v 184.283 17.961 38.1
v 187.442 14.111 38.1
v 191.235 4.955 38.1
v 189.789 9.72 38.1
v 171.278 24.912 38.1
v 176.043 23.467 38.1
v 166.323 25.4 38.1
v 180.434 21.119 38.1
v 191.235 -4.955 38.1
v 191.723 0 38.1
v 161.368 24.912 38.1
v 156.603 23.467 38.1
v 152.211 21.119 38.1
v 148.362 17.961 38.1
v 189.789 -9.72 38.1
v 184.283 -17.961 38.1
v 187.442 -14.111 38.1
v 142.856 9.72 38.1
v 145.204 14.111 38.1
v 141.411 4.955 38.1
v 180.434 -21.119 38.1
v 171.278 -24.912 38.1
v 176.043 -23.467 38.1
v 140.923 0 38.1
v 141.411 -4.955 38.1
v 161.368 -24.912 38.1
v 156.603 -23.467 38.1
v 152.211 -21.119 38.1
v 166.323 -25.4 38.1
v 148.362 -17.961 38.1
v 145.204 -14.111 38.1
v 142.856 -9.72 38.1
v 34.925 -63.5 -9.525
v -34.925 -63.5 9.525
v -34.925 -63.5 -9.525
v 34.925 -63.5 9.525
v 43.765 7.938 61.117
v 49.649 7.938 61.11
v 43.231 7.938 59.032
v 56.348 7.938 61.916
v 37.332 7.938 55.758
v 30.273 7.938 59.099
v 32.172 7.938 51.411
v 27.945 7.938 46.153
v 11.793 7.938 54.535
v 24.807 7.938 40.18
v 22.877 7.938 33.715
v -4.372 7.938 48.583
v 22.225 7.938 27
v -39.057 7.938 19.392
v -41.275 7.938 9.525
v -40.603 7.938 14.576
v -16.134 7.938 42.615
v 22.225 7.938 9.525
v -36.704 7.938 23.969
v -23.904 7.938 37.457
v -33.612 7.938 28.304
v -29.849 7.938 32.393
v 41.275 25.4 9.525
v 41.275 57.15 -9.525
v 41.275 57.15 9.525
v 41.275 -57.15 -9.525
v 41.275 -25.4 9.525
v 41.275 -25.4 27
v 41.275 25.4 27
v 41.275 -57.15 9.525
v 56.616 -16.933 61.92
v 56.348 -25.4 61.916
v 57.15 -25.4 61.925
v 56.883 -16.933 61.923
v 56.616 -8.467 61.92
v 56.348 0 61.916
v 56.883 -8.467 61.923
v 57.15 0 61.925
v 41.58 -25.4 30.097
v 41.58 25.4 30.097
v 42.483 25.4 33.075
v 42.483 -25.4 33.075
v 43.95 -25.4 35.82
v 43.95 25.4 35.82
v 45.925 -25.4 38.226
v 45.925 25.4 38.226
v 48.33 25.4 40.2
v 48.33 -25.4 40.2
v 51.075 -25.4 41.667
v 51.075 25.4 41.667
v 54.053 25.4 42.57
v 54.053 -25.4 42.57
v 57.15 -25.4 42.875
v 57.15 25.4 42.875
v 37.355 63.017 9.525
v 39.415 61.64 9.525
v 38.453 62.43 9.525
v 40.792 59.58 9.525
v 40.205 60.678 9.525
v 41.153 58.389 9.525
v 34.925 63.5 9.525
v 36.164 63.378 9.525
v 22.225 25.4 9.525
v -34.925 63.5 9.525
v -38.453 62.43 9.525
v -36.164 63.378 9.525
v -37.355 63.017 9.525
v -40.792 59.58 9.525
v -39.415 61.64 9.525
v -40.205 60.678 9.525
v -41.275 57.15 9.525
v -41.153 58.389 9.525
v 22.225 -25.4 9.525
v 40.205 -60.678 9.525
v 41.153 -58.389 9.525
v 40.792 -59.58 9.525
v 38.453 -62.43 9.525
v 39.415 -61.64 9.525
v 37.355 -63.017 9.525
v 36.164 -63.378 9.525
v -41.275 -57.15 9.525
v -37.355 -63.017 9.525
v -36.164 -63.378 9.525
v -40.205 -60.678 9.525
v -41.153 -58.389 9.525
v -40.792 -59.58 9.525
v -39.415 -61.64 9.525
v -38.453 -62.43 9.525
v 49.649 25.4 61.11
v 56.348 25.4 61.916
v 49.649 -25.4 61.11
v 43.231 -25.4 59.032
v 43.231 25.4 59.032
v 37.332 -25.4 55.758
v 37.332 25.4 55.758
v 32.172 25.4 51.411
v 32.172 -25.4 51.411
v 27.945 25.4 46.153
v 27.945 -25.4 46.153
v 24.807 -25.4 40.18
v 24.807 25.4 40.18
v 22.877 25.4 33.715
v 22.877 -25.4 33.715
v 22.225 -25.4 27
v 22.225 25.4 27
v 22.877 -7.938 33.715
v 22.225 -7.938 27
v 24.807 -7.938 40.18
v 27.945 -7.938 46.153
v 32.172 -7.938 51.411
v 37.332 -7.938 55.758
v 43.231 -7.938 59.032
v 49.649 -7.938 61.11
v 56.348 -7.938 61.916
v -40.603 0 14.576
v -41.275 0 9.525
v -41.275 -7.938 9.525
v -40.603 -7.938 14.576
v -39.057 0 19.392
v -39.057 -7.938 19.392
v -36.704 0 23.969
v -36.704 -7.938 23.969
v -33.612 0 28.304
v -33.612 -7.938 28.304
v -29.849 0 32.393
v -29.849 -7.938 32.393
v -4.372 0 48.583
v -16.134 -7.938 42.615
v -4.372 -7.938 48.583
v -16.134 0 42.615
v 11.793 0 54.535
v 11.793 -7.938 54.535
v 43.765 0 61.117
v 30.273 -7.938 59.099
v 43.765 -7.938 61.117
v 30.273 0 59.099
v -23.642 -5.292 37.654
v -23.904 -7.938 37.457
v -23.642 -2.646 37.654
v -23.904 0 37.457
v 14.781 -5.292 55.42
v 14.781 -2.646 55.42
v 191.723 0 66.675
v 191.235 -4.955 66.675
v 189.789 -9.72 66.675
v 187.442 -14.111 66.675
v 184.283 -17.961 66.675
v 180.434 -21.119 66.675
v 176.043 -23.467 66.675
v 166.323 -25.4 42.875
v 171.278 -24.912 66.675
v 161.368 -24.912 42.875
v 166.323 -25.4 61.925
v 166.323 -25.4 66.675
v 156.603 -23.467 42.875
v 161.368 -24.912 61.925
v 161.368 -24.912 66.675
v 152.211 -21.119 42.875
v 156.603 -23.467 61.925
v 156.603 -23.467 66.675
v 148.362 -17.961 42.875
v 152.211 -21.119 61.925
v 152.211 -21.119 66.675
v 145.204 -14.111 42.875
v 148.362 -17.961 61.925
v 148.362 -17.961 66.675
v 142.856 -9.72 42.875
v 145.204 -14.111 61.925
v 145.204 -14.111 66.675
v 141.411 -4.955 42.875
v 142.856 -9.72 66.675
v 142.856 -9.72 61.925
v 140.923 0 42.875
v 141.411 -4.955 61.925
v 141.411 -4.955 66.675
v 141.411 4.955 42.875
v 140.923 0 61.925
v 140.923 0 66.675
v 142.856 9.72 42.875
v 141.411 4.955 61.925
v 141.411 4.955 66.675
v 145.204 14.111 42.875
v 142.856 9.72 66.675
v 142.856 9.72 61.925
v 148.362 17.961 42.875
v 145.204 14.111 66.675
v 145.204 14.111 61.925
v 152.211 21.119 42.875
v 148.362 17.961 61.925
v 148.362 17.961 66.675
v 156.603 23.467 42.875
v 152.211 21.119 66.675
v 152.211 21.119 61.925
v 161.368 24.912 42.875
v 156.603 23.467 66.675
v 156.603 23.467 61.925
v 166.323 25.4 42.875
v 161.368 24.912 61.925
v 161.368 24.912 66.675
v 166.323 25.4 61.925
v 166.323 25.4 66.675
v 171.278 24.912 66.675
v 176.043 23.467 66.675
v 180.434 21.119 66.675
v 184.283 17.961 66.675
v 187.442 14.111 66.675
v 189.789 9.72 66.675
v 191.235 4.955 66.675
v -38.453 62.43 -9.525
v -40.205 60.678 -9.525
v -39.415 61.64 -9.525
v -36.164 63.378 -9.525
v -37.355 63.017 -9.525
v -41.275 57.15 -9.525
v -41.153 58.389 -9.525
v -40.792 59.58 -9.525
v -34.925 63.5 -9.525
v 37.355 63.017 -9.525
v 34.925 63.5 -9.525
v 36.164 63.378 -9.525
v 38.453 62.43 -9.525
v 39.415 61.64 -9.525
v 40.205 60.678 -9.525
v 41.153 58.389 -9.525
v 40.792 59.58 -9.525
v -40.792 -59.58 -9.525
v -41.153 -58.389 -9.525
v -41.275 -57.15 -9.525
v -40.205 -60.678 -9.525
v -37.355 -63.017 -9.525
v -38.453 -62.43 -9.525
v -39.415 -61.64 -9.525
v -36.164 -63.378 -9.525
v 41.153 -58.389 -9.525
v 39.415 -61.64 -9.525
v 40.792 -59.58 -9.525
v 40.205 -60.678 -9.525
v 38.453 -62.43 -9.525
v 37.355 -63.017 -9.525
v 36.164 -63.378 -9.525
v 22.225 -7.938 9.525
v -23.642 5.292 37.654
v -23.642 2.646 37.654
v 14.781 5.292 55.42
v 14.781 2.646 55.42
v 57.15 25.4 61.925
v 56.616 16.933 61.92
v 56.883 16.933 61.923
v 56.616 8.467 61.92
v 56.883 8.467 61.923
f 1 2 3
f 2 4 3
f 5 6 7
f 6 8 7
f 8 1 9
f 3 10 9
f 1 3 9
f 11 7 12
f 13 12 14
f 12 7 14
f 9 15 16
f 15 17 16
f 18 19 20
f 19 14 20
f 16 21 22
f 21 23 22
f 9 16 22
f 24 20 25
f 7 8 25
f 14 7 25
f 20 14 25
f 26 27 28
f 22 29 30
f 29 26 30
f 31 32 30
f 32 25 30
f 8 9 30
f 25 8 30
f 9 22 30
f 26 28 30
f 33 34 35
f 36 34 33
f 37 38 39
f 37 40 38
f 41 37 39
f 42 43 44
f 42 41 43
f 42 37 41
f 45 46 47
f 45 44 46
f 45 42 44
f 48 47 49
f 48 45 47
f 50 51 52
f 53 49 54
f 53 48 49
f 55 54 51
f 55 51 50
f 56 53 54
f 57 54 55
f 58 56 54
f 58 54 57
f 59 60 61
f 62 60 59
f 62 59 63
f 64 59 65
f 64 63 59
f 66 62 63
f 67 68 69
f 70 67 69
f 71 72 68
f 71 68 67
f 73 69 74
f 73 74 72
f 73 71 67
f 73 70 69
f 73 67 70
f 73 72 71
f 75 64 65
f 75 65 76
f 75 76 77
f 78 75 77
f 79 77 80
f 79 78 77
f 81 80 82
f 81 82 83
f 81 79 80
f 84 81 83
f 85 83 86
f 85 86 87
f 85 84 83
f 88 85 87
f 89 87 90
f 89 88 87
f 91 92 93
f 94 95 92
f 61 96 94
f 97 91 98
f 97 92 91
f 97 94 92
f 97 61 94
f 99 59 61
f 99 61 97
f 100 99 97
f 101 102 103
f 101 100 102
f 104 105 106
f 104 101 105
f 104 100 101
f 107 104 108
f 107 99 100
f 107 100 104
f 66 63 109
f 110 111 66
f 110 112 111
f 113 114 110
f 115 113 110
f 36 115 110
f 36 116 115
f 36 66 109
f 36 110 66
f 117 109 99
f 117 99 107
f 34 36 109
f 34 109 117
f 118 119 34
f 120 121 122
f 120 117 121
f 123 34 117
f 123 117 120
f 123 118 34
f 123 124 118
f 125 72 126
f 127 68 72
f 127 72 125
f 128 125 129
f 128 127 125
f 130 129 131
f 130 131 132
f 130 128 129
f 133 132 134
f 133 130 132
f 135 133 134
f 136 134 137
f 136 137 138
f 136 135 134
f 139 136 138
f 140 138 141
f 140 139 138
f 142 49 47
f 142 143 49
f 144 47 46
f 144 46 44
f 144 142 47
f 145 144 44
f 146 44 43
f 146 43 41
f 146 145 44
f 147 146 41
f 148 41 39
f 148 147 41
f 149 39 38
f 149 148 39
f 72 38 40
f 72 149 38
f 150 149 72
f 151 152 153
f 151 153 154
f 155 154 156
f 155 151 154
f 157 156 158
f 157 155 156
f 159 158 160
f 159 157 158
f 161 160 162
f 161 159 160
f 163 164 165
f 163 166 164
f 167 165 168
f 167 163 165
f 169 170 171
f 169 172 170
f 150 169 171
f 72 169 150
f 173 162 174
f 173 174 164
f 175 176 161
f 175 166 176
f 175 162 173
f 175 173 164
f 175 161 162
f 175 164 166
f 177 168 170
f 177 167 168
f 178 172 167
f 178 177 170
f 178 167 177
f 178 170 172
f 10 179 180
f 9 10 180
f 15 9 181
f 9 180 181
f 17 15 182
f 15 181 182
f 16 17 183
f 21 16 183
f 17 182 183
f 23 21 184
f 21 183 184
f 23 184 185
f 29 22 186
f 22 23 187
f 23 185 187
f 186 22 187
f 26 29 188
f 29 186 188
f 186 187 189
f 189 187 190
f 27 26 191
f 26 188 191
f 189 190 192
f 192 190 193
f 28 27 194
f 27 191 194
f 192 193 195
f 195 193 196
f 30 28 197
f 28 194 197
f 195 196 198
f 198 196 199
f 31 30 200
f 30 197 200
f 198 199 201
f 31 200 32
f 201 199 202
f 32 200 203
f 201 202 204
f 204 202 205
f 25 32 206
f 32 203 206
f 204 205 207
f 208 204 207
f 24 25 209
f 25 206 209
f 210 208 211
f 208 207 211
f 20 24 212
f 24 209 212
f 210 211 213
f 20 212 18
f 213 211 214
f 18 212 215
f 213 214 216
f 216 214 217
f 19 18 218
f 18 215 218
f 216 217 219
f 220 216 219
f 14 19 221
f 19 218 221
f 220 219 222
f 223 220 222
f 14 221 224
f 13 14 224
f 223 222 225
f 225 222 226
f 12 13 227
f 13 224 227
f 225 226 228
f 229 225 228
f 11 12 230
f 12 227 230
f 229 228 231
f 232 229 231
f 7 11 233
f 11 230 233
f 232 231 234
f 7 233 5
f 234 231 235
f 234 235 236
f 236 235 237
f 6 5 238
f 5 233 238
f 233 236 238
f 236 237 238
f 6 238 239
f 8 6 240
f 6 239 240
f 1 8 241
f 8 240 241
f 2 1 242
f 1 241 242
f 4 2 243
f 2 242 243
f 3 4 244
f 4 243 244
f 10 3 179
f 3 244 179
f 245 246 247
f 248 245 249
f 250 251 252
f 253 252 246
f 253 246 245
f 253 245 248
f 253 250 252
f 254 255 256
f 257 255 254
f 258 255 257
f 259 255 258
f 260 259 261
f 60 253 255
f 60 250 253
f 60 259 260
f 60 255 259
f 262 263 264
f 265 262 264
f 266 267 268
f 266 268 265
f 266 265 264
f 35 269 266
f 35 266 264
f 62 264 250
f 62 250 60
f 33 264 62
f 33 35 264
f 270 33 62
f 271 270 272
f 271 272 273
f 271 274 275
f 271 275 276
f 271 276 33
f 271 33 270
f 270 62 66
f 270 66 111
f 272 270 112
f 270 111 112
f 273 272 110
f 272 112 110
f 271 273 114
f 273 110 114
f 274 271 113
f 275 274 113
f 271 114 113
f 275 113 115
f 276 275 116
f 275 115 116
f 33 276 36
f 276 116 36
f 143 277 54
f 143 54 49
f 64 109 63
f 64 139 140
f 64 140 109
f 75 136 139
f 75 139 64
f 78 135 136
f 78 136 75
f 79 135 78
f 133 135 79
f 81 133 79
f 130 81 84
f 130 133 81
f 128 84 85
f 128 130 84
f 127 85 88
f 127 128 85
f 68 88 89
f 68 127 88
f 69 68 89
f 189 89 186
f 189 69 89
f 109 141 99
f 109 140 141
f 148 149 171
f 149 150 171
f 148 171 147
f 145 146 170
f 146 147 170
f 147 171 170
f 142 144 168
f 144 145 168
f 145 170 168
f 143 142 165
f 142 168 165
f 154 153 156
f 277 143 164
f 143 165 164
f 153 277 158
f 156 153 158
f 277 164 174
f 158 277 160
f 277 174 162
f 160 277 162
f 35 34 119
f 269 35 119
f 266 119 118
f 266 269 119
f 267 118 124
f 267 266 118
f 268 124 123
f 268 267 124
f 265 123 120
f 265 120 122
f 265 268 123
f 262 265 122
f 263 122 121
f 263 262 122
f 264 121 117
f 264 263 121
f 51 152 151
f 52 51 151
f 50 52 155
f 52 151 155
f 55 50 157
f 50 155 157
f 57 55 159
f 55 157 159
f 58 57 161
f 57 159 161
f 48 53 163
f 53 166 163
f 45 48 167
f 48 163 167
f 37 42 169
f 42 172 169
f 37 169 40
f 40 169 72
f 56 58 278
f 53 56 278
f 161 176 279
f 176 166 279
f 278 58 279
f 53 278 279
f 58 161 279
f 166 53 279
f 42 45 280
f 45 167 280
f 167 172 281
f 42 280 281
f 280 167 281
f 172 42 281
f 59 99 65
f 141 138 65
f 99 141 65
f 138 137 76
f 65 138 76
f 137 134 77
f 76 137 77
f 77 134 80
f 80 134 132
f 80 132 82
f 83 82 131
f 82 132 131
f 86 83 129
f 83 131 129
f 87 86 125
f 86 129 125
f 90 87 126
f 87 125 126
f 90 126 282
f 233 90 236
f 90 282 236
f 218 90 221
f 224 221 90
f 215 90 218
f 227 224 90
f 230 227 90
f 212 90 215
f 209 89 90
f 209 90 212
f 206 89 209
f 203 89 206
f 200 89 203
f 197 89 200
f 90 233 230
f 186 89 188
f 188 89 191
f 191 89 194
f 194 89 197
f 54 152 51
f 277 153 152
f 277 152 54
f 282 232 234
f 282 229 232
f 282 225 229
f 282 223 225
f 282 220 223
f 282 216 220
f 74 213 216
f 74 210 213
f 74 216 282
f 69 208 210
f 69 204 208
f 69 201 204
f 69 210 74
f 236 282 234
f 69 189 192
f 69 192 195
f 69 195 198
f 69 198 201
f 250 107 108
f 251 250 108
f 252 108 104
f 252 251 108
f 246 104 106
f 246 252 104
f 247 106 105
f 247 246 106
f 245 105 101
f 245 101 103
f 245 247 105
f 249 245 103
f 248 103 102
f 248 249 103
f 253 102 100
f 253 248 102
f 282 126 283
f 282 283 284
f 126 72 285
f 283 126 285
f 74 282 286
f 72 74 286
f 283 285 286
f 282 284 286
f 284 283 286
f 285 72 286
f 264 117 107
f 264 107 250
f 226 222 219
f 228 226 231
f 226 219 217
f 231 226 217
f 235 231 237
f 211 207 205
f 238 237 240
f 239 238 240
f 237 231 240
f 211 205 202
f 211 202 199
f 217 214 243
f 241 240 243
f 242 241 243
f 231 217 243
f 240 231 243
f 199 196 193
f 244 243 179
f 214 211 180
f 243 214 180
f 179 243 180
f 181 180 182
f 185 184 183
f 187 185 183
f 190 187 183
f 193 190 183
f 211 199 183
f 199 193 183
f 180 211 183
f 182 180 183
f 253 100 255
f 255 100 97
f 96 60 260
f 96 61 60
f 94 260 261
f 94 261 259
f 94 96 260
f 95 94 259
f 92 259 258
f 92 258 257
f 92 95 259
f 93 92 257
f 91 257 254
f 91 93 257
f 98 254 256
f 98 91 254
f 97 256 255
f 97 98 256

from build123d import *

# Parameters (mm, degrees)
F1_DEPTH = 63.5
F2_DEPTH = 7.9375
F0_W     = 25.4
F0_H     = 19.05
F3_DEPTH = 25.4
F5_R     = 6.35


with BuildPart() as f1:
    # F0 (on Front) → F1 (new body, symmetric)
    with BuildSketch(Plane.XZ):
        Polygon((-41.275, 9.525), (-41.275, -9.525), (41.275, -9.525), (41.275, 9.525), (22.225, 9.525), align=None)
    extrude(amount=F1_DEPTH, both=True)

    # F0 (on Front) → F3 (join, symmetric)
    with BuildSketch(Plane.XZ):
        with BuildLine():
            Line((22.225, 9.525), (41.275, 9.525))
            Line((41.275, 9.525), (41.275, 27.0002))
            ThreePointArc((41.275, 27.0002), (45.9246798487, 38.2255201513), (57.15, 42.8752))
            Line((57.15, 42.8752), (140.9229072666, 42.8752))
            Line((140.9229072666, 42.8752), (140.9229072666, 61.9252))
            Line((140.9229072666, 61.9252), (57.15, 61.9252))
            add(Edge.make_bspline(
                [(56.3476293335, 61.915981909), (56.6162268353, 61.9200045934), (56.8836936428, 61.9230778008), (57.15, 61.9252)],
                knots=[110.7064040288, 110.7064040288, 110.7064040288, 110.7064040288, 111.5045361635, 111.5045361635, 111.5045361635, 111.5045361635], degree=3))
            ThreePointArc((56.3476293335, 61.915981909), (32.1722256743, 51.4105751453), (22.225, 27.0002))
            Line((22.225, 27.0002), (22.225, 9.525))
        make_face()
        with Locations((153.6229072666, 52.4002)):
            Rectangle(F0_W, F0_H)
    extrude(amount=F3_DEPTH, both=True)

    # F0 (on Front) → F4 (revolve)
    with BuildSketch(Plane.XZ):
        Polygon((166.3229072666, 66.675), (166.3229072666, 61.9252), (166.3229072666, 42.8752), (166.3229072666, 38.1), (191.7229072666, 38.1), (191.7229072666, 66.675), align=None)
    revolve(axis=Axis((166.3229072666, 0, 52.3875), (0, 0, -1)))

    # F5
    f5_edges = [f1.edges().sort_by_distance(p)[0] for p in [
        (41.275, -63.5, 0),
        (-41.275, -63.5, 0),
        (-41.275, 63.5, 0),
        (41.275, 63.5, 0),
    ]]
    fillet(f5_edges, radius=F5_R)


with BuildPart() as f2:
    # F0 (on Front) → F2 (new body, symmetric)
    with BuildSketch(Plane.XZ):
        with BuildLine():
            add(Edge.make_bspline(
                [(-41.275, 9.525), (-39.9191045242, 42.5324796176), (19.0913126511, 61.3580079673), (56.3476293335, 61.915981909)],
                knots=[0, 0, 0, 0, 110.7064040288, 110.7064040288, 110.7064040288, 110.7064040288], degree=3))
            Line((-41.275, 9.525), (22.225, 9.525))
            Line((22.225, 9.525), (22.225, 27.0002))
            ThreePointArc((22.225, 27.0002), (32.1722256743, 51.4105751453), (56.3476293335, 61.915981909))
        make_face()
    extrude(amount=F2_DEPTH, both=True)


solid = Compound([f1.part, f2.part])
